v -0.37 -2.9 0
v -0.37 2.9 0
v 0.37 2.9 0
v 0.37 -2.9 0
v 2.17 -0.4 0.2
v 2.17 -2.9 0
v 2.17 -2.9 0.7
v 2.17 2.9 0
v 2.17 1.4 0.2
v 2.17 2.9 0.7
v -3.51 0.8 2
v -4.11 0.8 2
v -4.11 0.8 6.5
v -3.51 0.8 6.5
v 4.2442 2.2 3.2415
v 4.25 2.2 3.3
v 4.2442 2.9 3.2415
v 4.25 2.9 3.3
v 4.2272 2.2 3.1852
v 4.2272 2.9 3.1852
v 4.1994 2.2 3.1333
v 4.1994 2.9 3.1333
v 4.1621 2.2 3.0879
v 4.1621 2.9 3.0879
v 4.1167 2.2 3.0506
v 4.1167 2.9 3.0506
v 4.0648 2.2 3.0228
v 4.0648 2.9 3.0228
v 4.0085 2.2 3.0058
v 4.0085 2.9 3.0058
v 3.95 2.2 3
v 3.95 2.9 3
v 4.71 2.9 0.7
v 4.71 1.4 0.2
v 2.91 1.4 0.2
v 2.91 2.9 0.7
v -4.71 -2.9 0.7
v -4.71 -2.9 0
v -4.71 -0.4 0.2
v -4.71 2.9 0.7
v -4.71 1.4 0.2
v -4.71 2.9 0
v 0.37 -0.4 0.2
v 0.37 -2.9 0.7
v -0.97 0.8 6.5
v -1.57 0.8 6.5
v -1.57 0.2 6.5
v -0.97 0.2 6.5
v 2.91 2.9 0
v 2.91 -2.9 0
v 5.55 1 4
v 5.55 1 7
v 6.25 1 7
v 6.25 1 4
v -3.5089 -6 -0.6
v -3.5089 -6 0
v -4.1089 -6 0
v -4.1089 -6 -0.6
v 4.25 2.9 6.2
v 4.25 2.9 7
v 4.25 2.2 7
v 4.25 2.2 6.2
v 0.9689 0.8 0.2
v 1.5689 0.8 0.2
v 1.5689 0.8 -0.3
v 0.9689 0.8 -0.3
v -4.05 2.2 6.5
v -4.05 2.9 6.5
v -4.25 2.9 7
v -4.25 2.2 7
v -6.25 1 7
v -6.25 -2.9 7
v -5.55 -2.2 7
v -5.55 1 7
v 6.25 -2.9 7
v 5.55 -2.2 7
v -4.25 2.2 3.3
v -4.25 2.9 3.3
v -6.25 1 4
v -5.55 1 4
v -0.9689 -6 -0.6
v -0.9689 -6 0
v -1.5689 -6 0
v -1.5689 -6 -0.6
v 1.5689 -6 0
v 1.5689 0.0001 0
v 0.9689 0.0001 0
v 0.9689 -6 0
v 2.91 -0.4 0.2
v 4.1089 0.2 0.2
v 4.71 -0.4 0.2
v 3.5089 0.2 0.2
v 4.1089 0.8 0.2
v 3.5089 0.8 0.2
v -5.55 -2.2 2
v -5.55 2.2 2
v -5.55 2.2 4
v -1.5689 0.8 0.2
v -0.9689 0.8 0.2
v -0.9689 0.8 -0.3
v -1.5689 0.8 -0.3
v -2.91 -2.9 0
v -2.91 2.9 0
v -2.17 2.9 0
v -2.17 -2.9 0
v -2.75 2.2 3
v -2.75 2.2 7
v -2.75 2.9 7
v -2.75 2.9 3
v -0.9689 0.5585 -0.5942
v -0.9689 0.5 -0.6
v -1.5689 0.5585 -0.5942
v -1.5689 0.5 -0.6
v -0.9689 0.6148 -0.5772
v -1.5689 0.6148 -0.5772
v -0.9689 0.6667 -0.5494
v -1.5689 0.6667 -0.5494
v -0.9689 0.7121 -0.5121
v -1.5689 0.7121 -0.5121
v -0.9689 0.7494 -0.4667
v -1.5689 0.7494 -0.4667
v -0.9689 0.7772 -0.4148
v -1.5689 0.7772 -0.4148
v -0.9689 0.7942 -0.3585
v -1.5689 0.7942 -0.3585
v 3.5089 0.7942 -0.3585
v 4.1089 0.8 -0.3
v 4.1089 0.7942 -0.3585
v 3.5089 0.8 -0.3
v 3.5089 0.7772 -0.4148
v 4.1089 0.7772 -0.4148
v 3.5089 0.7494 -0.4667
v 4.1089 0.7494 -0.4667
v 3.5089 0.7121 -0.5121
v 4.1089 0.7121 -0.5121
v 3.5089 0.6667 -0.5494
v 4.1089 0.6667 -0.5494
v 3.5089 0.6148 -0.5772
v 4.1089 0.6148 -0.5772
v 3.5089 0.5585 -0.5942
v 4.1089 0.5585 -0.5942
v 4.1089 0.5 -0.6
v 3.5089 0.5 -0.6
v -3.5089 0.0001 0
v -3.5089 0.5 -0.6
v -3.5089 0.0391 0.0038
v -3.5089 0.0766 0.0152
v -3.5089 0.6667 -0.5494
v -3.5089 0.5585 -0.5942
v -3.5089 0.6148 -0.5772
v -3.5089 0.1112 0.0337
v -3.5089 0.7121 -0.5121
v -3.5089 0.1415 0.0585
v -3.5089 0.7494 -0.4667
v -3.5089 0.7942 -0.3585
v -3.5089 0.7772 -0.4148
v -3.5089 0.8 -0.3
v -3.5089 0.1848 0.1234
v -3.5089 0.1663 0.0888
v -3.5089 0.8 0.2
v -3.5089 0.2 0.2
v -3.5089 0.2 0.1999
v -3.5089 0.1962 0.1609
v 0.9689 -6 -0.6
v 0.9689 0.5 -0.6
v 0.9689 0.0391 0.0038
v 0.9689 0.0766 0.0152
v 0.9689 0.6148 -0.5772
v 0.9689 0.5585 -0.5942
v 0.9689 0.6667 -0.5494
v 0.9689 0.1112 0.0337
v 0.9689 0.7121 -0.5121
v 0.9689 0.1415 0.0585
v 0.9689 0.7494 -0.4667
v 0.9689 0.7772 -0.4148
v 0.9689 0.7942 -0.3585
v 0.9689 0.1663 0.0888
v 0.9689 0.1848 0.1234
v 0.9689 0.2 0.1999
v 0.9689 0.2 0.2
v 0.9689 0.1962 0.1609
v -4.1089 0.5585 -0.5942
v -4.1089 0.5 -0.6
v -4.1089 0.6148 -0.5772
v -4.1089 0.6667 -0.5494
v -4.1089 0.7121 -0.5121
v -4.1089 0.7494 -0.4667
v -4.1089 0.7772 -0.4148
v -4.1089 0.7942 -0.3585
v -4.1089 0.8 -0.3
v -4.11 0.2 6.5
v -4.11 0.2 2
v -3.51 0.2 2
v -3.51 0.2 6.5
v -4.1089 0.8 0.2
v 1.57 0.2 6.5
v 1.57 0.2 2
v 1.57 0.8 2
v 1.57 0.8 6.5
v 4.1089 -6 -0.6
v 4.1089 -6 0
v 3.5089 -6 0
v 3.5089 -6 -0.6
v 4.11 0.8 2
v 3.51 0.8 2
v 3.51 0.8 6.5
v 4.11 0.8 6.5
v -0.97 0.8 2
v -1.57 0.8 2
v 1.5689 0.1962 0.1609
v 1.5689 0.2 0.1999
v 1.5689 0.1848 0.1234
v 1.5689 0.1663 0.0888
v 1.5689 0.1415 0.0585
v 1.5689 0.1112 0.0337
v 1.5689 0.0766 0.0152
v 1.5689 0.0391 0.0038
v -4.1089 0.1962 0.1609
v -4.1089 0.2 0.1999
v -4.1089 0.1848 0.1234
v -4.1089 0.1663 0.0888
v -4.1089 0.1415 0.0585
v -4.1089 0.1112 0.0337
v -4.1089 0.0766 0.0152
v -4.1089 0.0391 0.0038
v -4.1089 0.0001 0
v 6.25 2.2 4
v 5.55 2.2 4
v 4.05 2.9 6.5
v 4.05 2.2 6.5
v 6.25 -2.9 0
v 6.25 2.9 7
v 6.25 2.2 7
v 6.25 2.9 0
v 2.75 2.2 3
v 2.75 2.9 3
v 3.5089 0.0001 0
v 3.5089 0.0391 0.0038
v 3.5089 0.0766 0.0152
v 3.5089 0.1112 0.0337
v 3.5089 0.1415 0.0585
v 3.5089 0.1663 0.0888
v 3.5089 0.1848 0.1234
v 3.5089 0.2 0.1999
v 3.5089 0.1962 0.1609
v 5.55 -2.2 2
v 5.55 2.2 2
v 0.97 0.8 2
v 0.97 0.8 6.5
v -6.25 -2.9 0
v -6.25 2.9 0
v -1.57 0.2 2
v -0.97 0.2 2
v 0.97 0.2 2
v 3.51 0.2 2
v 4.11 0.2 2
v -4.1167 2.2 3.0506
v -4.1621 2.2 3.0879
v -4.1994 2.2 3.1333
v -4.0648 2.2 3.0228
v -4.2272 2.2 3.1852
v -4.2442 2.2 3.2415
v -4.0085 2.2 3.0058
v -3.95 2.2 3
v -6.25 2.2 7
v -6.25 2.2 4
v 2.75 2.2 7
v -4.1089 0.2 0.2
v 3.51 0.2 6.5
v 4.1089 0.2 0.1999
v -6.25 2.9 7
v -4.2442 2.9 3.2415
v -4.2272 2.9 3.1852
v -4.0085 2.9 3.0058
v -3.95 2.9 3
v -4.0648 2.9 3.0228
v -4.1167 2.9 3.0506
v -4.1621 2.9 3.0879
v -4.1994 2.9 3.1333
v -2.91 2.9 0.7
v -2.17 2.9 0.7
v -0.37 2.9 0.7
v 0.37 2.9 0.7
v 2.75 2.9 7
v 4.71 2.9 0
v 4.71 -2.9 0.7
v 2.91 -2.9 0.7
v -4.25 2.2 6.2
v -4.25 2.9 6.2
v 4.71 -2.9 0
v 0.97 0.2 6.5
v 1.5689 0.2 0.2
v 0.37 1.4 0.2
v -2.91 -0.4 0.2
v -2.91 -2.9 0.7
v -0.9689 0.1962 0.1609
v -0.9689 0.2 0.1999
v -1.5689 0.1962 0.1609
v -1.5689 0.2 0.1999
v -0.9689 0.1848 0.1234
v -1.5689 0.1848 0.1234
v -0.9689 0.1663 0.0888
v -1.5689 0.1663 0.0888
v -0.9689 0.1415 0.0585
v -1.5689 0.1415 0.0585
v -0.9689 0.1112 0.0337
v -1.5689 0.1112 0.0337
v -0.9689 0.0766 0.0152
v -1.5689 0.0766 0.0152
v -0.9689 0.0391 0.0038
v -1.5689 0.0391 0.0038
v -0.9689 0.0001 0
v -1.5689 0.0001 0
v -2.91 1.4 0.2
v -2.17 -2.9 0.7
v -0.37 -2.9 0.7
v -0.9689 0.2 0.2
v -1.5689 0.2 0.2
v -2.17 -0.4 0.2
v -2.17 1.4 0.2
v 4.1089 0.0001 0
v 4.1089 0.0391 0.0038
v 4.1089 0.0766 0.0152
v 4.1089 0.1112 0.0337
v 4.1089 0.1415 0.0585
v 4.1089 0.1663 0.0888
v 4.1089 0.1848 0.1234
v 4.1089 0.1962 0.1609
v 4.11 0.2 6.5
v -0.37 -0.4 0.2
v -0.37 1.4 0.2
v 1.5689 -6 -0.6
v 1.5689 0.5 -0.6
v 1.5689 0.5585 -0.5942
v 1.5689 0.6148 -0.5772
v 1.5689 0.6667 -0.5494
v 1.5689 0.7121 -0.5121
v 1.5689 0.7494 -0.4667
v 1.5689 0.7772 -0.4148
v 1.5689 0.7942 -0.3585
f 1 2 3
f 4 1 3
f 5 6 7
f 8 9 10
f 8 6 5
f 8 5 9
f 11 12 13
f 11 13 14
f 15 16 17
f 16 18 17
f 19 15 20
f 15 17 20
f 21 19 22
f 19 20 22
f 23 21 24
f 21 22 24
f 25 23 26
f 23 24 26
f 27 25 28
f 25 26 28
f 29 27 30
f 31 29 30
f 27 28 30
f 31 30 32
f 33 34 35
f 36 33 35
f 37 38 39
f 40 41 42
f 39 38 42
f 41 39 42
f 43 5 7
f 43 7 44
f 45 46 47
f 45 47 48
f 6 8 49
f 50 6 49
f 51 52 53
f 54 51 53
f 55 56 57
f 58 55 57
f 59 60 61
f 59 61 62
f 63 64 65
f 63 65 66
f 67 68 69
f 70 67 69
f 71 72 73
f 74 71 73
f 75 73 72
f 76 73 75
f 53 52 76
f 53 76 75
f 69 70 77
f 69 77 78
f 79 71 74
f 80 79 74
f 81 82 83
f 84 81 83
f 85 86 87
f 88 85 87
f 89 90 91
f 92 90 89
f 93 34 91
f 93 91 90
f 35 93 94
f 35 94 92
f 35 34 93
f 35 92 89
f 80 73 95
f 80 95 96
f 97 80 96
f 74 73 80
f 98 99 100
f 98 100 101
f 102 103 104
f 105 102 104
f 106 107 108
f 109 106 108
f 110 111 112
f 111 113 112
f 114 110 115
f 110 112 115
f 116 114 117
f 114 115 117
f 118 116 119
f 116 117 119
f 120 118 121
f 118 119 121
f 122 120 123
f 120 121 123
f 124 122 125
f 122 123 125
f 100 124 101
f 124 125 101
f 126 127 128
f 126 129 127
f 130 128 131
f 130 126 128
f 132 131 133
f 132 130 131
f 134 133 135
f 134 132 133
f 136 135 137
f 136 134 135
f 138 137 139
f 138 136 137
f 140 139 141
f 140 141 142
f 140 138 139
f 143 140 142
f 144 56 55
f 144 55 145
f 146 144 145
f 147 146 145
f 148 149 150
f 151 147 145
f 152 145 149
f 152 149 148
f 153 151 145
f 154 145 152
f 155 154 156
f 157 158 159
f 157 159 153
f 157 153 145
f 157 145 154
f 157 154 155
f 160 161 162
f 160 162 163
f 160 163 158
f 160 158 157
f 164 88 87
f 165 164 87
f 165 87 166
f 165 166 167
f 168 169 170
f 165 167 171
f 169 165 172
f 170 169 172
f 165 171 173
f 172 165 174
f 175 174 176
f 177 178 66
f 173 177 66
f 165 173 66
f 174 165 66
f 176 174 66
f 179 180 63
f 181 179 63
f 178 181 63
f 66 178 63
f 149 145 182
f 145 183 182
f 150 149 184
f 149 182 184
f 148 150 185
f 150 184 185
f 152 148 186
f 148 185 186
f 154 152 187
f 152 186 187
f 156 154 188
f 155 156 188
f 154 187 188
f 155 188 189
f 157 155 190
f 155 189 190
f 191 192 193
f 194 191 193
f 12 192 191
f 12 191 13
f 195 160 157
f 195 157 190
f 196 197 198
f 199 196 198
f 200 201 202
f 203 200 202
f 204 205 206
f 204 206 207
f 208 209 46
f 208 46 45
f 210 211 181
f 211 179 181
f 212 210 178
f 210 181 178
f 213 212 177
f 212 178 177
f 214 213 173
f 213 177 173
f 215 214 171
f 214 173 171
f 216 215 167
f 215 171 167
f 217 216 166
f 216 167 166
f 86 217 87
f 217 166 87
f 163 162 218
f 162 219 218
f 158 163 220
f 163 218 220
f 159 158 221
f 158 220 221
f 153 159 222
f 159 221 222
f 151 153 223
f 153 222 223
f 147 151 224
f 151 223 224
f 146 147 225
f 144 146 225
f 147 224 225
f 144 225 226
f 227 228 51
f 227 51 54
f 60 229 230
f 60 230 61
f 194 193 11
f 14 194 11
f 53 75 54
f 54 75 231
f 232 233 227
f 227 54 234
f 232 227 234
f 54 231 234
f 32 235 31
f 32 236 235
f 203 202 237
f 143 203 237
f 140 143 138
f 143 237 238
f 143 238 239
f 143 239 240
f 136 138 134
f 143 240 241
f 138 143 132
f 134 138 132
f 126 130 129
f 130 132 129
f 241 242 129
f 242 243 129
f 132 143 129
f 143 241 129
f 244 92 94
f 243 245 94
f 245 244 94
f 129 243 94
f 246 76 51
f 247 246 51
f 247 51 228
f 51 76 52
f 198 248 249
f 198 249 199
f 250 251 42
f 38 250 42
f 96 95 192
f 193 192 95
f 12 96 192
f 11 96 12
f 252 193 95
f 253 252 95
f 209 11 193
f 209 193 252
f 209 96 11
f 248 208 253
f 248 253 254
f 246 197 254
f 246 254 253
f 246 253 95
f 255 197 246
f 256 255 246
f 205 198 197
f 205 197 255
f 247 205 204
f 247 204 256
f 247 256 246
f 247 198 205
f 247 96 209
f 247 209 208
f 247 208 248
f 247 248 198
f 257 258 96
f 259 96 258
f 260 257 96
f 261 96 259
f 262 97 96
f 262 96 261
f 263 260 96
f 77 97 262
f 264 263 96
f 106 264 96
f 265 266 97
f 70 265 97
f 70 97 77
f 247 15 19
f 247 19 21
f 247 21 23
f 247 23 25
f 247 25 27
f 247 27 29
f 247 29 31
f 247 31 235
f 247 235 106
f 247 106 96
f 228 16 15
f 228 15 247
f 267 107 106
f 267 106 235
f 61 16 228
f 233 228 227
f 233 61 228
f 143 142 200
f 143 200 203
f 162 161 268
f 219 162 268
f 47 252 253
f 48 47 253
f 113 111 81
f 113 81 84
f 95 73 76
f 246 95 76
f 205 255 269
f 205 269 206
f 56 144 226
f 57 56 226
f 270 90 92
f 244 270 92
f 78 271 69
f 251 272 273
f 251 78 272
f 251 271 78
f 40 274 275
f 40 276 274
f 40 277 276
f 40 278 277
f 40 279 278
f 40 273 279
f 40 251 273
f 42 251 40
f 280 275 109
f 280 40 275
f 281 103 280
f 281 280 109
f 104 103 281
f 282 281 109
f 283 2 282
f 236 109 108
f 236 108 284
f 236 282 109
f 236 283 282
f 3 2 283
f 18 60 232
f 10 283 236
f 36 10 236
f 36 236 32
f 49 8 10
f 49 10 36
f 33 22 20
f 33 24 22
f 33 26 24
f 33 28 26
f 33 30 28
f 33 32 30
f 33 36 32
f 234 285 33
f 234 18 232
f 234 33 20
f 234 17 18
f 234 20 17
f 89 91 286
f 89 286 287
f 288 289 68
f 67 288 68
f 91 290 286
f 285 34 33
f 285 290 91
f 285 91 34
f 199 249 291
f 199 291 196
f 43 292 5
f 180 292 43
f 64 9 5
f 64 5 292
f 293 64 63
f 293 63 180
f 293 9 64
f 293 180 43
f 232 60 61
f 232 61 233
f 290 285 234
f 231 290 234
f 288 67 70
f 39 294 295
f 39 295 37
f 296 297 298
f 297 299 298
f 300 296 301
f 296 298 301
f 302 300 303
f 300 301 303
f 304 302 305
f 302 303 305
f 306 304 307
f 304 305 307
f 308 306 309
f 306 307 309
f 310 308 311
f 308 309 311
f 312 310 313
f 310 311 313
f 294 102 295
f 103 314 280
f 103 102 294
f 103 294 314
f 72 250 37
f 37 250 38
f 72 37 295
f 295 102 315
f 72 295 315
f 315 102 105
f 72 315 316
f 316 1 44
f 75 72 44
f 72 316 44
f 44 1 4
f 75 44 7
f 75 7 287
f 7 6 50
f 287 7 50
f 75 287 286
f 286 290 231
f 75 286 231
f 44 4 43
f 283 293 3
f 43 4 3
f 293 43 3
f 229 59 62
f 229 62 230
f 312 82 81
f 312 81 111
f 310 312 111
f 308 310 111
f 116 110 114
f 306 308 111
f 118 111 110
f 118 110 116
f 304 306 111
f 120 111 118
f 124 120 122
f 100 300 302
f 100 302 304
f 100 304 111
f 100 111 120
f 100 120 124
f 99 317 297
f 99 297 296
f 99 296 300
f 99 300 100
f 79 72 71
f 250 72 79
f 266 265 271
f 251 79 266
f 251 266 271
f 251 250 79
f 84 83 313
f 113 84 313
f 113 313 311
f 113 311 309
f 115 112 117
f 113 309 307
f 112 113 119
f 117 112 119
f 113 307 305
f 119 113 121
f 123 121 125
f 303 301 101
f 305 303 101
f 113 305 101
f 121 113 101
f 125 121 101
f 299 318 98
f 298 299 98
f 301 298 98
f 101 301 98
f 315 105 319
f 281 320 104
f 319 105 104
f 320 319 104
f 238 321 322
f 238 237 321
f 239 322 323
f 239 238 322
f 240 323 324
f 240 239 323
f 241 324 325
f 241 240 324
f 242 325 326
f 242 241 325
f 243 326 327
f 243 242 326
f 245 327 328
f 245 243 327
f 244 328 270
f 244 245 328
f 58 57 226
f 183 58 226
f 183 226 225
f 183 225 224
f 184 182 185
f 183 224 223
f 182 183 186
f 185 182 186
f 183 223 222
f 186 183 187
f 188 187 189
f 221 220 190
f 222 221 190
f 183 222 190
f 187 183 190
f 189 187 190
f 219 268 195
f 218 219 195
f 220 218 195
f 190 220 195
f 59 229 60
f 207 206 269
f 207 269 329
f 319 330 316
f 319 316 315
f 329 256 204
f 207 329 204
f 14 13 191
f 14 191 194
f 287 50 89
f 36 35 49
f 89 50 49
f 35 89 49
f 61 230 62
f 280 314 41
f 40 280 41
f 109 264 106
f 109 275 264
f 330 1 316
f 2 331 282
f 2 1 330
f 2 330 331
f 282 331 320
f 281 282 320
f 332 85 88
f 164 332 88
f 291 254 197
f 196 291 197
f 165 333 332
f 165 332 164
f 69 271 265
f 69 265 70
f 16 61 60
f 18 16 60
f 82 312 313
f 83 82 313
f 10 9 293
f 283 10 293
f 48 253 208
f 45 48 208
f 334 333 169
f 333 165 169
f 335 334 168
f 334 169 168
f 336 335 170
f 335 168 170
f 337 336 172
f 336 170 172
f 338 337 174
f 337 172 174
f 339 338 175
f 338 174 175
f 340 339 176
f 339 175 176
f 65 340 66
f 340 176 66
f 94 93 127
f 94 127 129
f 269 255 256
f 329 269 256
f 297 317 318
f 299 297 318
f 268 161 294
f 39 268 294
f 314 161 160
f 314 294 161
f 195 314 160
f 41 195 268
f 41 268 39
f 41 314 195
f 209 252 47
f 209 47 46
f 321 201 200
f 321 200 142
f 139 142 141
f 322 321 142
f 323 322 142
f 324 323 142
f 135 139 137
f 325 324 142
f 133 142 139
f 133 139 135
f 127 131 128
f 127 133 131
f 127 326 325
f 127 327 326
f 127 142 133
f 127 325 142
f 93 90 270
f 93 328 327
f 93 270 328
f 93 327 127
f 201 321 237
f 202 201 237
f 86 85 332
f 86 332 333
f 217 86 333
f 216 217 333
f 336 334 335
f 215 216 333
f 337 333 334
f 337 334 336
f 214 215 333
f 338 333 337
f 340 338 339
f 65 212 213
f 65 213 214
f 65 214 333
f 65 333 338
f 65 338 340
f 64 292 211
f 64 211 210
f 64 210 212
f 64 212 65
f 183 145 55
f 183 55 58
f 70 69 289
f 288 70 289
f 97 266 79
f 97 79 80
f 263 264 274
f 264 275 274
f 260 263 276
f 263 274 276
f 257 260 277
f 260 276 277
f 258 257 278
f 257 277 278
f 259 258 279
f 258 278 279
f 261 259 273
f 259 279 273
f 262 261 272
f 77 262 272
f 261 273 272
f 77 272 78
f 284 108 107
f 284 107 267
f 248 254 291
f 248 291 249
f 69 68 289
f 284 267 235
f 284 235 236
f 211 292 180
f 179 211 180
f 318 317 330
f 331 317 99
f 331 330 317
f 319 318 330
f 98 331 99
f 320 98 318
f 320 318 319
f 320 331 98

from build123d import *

# Parameters (mm, degrees)
SKETCH_1_W          = 12.5
SKETCH_1_H          = 5.8
EXTRUDE_1_DEPTH     = 7
SKETCH_2_W          = 11.1
SKETCH_2_H          = 4.4
CUT_EXTRUDE_1_DEPTH = 5
SKETCH_3_W          = 0.7
SKETCH_3_H          = 1.2
CUT_EXTRUDE_2_DEPTH = 3
SKETCH_4_W          = 1.5
SKETCH_4_H          = 0.7
CUT_EXTRUDE_3_DEPTH = 4
FILLET_1_R          = 0.3
EXTRUDE_2_DEPTH     = 0.7
EXTRUDE_2_2_DEPTH   = 0.7
SKETCH_6_W          = 0.6
SKETCH_6_H          = 0.6
EXTRUDE_3_DEPTH     = 4.5
SKETCH_7_W          = 1.8
SKETCH_7_H          = 5.8
CUT_EXTRUDE_4_DEPTH = 0.2
SKETCH_8_W          = 0.6
SKETCH_8_H          = 0.6
EXTRUDE_4_DEPTH     = 0.2
SKETCH_9_W          = 0.6
SKETCH_9_H          = 6.8
EXTRUDE_5_DEPTH     = 0.6
FILLET_2_R          = 0.3
FILLET_3_R          = 0.2
CHAMFER_1_SIZE      = 0.5
CHAMFER_1_SIZE2     = 1.5
CHAMFER_2_SIZE      = 0.5
CHAMFER_2_SIZE2     = 2.5


with BuildPart() as part:
    # 草图1 → 凸台-拉伸1 (new body)
    with BuildSketch(Plane.XY):
        Rectangle(SKETCH_1_W, SKETCH_1_H)
    extrude(amount=EXTRUDE_1_DEPTH)

    # 草图2 → 切除-拉伸1 (cut)
    with BuildSketch(Plane.XY.offset(7)):
        Rectangle(SKETCH_2_W, SKETCH_2_H)
    extrude(amount=-CUT_EXTRUDE_1_DEPTH, mode=Mode.SUBTRACT)

    # 草图3 → 切除-拉伸2 (cut)
    with BuildSketch(Plane.XY.offset(7)):
        with Locations((-5.9, 1.6)):
            Rectangle(SKETCH_3_W, SKETCH_3_H)
        with Locations((5.9, 1.6)):
            Rectangle(SKETCH_3_W, SKETCH_3_H)
    extrude(amount=-CUT_EXTRUDE_2_DEPTH, mode=Mode.SUBTRACT)

    # 草图4 → 切除-拉伸3 (cut)
    with BuildSketch(Plane.XY.offset(7)):
        with Locations((-3.5, 2.55)):
            Rectangle(SKETCH_4_W, SKETCH_4_H)
        with Locations((3.5, 2.55)):
            Rectangle(SKETCH_4_W, SKETCH_4_H)
    extrude(amount=-CUT_EXTRUDE_3_DEPTH, mode=Mode.SUBTRACT)

    # 圆角1
    fillet_1_edges = [part.edges().sort_by_distance(p)[0] for p in [
        (-4.25, 2.55, 3),
        (4.25, 2.55, 3),
    ]]
    fillet(fillet_1_edges, radius=FILLET_1_R)

    # 草图6 → 凸台-拉伸3 (add)
    with BuildSketch(Plane.XY.offset(2)):
        with Locations((-3.81, 0.5)):
            Rectangle(SKETCH_6_W, SKETCH_6_H)
        with Locations((-1.27, 0.5)):
            Rectangle(SKETCH_6_W, SKETCH_6_H)
        with Locations((1.27, 0.5)):
            Rectangle(SKETCH_6_W, SKETCH_6_H)
        with Locations((3.81, 0.5)):
            Rectangle(SKETCH_6_W, SKETCH_6_H)
    extrude(amount=EXTRUDE_3_DEPTH)

    # 草图7 → 切除-拉伸4 (cut)
    with BuildSketch(Plane(origin=(0, 0, 0), x_dir=(-1, 0, 0), z_dir=(0, 0, -1))):
        with Locations((-3.81, 0)):
            Rectangle(SKETCH_7_W, SKETCH_7_H)
        with Locations((-1.27, 0)):
            Rectangle(SKETCH_7_W, SKETCH_7_H)
        with Locations((1.27, 0)):
            Rectangle(SKETCH_7_W, SKETCH_7_H)
        with Locations((3.81, 0)):
            Rectangle(SKETCH_7_W, SKETCH_7_H)
    extrude(amount=-CUT_EXTRUDE_4_DEPTH, mode=Mode.SUBTRACT)

    # 草图8 → 凸台-拉伸4 (add)
    with BuildSketch(Plane(origin=(0, 0, 0.2), x_dir=(-1, 0, 0), z_dir=(0, 0, -1))):
        with Locations((-3.808858408, 0.5)):
            Rectangle(SKETCH_8_W, SKETCH_8_H)
        with Locations((-1.268858408, 0.5)):
            Rectangle(SKETCH_8_W, SKETCH_8_H)
        with Locations((1.268858408, 0.5)):
            Rectangle(SKETCH_8_W, SKETCH_8_H)
        with Locations((3.808858408, 0.5)):
            Rectangle(SKETCH_8_W, SKETCH_8_H)
    extrude(amount=EXTRUDE_4_DEPTH)

    # 草图9 → 凸台-拉伸5 (add)
    with BuildSketch(Plane(origin=(0, 0, 0), x_dir=(-1, 0, 0), z_dir=(0, 0, -1))):
        with Locations((-3.808858408, -2.6)):
            Rectangle(SKETCH_9_W, SKETCH_9_H)
        with Locations((-1.268858408, -2.6)):
            Rectangle(SKETCH_9_W, SKETCH_9_H)
        with Locations((1.268858408, -2.6)):
            Rectangle(SKETCH_9_W, SKETCH_9_H)
        with Locations((3.808858408, -2.6)):
            Rectangle(SKETCH_9_W, SKETCH_9_H)
    extrude(amount=EXTRUDE_5_DEPTH)

    # 圆角2
    fillet_2_edges = [part.edges().sort_by_distance(p)[0] for p in [
        (3.808858408, 0.8, -0.6),
        (1.268858408, 0.8, -0.6),
        (-1.268858408, 0.8, -0.6),
        (-3.808858408, 0.8, -0.6),
    ]]
    fillet(fillet_2_edges, radius=FILLET_2_R)

    # 圆角3
    fillet_3_edges = [part.edges().sort_by_distance(p)[0] for p in [
        (-3.808858408, 0.2, 0),
        (-1.268858408, 0.2, 0),
        (1.268858408, 0.2, 0),
        (3.808858408, 0.2, 0),
    ]]
    fillet(fillet_3_edges, radius=FILLET_3_R - 0.0001)  # a hair under: the kernel refuses the full size

    # 倒角1
    chamfer_1_edges = [part.edges().sort_by_distance(p)[0] for p in [
        (3.81, 2.9, 0.2),
        (1.27, 2.9, 0.2),
        (-1.27, 2.9, 0.2),
        (-3.81, 2.9, 0.2),
    ]]
    chamfer_1_side = [part.faces().sort_by_distance(p)[0] for p in [
        (0, 2.9, 3.322928899),
    ]]
    chamfer(chamfer_1_edges, length=CHAMFER_1_SIZE, length2=CHAMFER_1_SIZE2, reference=chamfer_1_side[0])

    # 倒角2
    chamfer_2_edges = [part.edges().sort_by_distance(p)[0] for p in [
        (3.81, -2.9, 0.2),
        (1.27, -2.9, 0.2),
        (-1.27, -2.9, 0.2),
        (-3.81, -2.9, 0.2),
    ]]
    chamfer_2_side = [part.faces().sort_by_distance(p)[0] for p in [
        (0, -2.9, 3.556890541),
    ]]
    chamfer(chamfer_2_edges, length=CHAMFER_2_SIZE, length2=CHAMFER_2_SIZE2, reference=chamfer_2_side[0])


with BuildPart() as body_2:
    # 草图5 → 凸台-拉伸2 (new body)
    with BuildSketch(Plane(origin=(0, 2.9, 0), x_dir=(1, 0, 0), z_dir=(0, 1, 0))):
        Polygon((-4.25, -7), (-4.25, -6.2), (-4.05, -6.5), align=None)
    extrude(amount=-EXTRUDE_2_DEPTH)


with BuildPart() as body_3:
    # 草图5 → Extrude 2 2 (new body)
    with BuildSketch(Plane(origin=(0, 2.9, 0), x_dir=(1, 0, 0), z_dir=(0, 1, 0))):
        Polygon((4.05, -6.5), (4.25, -7), (4.25, -6.2), align=None)
    extrude(amount=-EXTRUDE_2_2_DEPTH)


solid = Compound([part.part, body_2.part, body_3.part])
